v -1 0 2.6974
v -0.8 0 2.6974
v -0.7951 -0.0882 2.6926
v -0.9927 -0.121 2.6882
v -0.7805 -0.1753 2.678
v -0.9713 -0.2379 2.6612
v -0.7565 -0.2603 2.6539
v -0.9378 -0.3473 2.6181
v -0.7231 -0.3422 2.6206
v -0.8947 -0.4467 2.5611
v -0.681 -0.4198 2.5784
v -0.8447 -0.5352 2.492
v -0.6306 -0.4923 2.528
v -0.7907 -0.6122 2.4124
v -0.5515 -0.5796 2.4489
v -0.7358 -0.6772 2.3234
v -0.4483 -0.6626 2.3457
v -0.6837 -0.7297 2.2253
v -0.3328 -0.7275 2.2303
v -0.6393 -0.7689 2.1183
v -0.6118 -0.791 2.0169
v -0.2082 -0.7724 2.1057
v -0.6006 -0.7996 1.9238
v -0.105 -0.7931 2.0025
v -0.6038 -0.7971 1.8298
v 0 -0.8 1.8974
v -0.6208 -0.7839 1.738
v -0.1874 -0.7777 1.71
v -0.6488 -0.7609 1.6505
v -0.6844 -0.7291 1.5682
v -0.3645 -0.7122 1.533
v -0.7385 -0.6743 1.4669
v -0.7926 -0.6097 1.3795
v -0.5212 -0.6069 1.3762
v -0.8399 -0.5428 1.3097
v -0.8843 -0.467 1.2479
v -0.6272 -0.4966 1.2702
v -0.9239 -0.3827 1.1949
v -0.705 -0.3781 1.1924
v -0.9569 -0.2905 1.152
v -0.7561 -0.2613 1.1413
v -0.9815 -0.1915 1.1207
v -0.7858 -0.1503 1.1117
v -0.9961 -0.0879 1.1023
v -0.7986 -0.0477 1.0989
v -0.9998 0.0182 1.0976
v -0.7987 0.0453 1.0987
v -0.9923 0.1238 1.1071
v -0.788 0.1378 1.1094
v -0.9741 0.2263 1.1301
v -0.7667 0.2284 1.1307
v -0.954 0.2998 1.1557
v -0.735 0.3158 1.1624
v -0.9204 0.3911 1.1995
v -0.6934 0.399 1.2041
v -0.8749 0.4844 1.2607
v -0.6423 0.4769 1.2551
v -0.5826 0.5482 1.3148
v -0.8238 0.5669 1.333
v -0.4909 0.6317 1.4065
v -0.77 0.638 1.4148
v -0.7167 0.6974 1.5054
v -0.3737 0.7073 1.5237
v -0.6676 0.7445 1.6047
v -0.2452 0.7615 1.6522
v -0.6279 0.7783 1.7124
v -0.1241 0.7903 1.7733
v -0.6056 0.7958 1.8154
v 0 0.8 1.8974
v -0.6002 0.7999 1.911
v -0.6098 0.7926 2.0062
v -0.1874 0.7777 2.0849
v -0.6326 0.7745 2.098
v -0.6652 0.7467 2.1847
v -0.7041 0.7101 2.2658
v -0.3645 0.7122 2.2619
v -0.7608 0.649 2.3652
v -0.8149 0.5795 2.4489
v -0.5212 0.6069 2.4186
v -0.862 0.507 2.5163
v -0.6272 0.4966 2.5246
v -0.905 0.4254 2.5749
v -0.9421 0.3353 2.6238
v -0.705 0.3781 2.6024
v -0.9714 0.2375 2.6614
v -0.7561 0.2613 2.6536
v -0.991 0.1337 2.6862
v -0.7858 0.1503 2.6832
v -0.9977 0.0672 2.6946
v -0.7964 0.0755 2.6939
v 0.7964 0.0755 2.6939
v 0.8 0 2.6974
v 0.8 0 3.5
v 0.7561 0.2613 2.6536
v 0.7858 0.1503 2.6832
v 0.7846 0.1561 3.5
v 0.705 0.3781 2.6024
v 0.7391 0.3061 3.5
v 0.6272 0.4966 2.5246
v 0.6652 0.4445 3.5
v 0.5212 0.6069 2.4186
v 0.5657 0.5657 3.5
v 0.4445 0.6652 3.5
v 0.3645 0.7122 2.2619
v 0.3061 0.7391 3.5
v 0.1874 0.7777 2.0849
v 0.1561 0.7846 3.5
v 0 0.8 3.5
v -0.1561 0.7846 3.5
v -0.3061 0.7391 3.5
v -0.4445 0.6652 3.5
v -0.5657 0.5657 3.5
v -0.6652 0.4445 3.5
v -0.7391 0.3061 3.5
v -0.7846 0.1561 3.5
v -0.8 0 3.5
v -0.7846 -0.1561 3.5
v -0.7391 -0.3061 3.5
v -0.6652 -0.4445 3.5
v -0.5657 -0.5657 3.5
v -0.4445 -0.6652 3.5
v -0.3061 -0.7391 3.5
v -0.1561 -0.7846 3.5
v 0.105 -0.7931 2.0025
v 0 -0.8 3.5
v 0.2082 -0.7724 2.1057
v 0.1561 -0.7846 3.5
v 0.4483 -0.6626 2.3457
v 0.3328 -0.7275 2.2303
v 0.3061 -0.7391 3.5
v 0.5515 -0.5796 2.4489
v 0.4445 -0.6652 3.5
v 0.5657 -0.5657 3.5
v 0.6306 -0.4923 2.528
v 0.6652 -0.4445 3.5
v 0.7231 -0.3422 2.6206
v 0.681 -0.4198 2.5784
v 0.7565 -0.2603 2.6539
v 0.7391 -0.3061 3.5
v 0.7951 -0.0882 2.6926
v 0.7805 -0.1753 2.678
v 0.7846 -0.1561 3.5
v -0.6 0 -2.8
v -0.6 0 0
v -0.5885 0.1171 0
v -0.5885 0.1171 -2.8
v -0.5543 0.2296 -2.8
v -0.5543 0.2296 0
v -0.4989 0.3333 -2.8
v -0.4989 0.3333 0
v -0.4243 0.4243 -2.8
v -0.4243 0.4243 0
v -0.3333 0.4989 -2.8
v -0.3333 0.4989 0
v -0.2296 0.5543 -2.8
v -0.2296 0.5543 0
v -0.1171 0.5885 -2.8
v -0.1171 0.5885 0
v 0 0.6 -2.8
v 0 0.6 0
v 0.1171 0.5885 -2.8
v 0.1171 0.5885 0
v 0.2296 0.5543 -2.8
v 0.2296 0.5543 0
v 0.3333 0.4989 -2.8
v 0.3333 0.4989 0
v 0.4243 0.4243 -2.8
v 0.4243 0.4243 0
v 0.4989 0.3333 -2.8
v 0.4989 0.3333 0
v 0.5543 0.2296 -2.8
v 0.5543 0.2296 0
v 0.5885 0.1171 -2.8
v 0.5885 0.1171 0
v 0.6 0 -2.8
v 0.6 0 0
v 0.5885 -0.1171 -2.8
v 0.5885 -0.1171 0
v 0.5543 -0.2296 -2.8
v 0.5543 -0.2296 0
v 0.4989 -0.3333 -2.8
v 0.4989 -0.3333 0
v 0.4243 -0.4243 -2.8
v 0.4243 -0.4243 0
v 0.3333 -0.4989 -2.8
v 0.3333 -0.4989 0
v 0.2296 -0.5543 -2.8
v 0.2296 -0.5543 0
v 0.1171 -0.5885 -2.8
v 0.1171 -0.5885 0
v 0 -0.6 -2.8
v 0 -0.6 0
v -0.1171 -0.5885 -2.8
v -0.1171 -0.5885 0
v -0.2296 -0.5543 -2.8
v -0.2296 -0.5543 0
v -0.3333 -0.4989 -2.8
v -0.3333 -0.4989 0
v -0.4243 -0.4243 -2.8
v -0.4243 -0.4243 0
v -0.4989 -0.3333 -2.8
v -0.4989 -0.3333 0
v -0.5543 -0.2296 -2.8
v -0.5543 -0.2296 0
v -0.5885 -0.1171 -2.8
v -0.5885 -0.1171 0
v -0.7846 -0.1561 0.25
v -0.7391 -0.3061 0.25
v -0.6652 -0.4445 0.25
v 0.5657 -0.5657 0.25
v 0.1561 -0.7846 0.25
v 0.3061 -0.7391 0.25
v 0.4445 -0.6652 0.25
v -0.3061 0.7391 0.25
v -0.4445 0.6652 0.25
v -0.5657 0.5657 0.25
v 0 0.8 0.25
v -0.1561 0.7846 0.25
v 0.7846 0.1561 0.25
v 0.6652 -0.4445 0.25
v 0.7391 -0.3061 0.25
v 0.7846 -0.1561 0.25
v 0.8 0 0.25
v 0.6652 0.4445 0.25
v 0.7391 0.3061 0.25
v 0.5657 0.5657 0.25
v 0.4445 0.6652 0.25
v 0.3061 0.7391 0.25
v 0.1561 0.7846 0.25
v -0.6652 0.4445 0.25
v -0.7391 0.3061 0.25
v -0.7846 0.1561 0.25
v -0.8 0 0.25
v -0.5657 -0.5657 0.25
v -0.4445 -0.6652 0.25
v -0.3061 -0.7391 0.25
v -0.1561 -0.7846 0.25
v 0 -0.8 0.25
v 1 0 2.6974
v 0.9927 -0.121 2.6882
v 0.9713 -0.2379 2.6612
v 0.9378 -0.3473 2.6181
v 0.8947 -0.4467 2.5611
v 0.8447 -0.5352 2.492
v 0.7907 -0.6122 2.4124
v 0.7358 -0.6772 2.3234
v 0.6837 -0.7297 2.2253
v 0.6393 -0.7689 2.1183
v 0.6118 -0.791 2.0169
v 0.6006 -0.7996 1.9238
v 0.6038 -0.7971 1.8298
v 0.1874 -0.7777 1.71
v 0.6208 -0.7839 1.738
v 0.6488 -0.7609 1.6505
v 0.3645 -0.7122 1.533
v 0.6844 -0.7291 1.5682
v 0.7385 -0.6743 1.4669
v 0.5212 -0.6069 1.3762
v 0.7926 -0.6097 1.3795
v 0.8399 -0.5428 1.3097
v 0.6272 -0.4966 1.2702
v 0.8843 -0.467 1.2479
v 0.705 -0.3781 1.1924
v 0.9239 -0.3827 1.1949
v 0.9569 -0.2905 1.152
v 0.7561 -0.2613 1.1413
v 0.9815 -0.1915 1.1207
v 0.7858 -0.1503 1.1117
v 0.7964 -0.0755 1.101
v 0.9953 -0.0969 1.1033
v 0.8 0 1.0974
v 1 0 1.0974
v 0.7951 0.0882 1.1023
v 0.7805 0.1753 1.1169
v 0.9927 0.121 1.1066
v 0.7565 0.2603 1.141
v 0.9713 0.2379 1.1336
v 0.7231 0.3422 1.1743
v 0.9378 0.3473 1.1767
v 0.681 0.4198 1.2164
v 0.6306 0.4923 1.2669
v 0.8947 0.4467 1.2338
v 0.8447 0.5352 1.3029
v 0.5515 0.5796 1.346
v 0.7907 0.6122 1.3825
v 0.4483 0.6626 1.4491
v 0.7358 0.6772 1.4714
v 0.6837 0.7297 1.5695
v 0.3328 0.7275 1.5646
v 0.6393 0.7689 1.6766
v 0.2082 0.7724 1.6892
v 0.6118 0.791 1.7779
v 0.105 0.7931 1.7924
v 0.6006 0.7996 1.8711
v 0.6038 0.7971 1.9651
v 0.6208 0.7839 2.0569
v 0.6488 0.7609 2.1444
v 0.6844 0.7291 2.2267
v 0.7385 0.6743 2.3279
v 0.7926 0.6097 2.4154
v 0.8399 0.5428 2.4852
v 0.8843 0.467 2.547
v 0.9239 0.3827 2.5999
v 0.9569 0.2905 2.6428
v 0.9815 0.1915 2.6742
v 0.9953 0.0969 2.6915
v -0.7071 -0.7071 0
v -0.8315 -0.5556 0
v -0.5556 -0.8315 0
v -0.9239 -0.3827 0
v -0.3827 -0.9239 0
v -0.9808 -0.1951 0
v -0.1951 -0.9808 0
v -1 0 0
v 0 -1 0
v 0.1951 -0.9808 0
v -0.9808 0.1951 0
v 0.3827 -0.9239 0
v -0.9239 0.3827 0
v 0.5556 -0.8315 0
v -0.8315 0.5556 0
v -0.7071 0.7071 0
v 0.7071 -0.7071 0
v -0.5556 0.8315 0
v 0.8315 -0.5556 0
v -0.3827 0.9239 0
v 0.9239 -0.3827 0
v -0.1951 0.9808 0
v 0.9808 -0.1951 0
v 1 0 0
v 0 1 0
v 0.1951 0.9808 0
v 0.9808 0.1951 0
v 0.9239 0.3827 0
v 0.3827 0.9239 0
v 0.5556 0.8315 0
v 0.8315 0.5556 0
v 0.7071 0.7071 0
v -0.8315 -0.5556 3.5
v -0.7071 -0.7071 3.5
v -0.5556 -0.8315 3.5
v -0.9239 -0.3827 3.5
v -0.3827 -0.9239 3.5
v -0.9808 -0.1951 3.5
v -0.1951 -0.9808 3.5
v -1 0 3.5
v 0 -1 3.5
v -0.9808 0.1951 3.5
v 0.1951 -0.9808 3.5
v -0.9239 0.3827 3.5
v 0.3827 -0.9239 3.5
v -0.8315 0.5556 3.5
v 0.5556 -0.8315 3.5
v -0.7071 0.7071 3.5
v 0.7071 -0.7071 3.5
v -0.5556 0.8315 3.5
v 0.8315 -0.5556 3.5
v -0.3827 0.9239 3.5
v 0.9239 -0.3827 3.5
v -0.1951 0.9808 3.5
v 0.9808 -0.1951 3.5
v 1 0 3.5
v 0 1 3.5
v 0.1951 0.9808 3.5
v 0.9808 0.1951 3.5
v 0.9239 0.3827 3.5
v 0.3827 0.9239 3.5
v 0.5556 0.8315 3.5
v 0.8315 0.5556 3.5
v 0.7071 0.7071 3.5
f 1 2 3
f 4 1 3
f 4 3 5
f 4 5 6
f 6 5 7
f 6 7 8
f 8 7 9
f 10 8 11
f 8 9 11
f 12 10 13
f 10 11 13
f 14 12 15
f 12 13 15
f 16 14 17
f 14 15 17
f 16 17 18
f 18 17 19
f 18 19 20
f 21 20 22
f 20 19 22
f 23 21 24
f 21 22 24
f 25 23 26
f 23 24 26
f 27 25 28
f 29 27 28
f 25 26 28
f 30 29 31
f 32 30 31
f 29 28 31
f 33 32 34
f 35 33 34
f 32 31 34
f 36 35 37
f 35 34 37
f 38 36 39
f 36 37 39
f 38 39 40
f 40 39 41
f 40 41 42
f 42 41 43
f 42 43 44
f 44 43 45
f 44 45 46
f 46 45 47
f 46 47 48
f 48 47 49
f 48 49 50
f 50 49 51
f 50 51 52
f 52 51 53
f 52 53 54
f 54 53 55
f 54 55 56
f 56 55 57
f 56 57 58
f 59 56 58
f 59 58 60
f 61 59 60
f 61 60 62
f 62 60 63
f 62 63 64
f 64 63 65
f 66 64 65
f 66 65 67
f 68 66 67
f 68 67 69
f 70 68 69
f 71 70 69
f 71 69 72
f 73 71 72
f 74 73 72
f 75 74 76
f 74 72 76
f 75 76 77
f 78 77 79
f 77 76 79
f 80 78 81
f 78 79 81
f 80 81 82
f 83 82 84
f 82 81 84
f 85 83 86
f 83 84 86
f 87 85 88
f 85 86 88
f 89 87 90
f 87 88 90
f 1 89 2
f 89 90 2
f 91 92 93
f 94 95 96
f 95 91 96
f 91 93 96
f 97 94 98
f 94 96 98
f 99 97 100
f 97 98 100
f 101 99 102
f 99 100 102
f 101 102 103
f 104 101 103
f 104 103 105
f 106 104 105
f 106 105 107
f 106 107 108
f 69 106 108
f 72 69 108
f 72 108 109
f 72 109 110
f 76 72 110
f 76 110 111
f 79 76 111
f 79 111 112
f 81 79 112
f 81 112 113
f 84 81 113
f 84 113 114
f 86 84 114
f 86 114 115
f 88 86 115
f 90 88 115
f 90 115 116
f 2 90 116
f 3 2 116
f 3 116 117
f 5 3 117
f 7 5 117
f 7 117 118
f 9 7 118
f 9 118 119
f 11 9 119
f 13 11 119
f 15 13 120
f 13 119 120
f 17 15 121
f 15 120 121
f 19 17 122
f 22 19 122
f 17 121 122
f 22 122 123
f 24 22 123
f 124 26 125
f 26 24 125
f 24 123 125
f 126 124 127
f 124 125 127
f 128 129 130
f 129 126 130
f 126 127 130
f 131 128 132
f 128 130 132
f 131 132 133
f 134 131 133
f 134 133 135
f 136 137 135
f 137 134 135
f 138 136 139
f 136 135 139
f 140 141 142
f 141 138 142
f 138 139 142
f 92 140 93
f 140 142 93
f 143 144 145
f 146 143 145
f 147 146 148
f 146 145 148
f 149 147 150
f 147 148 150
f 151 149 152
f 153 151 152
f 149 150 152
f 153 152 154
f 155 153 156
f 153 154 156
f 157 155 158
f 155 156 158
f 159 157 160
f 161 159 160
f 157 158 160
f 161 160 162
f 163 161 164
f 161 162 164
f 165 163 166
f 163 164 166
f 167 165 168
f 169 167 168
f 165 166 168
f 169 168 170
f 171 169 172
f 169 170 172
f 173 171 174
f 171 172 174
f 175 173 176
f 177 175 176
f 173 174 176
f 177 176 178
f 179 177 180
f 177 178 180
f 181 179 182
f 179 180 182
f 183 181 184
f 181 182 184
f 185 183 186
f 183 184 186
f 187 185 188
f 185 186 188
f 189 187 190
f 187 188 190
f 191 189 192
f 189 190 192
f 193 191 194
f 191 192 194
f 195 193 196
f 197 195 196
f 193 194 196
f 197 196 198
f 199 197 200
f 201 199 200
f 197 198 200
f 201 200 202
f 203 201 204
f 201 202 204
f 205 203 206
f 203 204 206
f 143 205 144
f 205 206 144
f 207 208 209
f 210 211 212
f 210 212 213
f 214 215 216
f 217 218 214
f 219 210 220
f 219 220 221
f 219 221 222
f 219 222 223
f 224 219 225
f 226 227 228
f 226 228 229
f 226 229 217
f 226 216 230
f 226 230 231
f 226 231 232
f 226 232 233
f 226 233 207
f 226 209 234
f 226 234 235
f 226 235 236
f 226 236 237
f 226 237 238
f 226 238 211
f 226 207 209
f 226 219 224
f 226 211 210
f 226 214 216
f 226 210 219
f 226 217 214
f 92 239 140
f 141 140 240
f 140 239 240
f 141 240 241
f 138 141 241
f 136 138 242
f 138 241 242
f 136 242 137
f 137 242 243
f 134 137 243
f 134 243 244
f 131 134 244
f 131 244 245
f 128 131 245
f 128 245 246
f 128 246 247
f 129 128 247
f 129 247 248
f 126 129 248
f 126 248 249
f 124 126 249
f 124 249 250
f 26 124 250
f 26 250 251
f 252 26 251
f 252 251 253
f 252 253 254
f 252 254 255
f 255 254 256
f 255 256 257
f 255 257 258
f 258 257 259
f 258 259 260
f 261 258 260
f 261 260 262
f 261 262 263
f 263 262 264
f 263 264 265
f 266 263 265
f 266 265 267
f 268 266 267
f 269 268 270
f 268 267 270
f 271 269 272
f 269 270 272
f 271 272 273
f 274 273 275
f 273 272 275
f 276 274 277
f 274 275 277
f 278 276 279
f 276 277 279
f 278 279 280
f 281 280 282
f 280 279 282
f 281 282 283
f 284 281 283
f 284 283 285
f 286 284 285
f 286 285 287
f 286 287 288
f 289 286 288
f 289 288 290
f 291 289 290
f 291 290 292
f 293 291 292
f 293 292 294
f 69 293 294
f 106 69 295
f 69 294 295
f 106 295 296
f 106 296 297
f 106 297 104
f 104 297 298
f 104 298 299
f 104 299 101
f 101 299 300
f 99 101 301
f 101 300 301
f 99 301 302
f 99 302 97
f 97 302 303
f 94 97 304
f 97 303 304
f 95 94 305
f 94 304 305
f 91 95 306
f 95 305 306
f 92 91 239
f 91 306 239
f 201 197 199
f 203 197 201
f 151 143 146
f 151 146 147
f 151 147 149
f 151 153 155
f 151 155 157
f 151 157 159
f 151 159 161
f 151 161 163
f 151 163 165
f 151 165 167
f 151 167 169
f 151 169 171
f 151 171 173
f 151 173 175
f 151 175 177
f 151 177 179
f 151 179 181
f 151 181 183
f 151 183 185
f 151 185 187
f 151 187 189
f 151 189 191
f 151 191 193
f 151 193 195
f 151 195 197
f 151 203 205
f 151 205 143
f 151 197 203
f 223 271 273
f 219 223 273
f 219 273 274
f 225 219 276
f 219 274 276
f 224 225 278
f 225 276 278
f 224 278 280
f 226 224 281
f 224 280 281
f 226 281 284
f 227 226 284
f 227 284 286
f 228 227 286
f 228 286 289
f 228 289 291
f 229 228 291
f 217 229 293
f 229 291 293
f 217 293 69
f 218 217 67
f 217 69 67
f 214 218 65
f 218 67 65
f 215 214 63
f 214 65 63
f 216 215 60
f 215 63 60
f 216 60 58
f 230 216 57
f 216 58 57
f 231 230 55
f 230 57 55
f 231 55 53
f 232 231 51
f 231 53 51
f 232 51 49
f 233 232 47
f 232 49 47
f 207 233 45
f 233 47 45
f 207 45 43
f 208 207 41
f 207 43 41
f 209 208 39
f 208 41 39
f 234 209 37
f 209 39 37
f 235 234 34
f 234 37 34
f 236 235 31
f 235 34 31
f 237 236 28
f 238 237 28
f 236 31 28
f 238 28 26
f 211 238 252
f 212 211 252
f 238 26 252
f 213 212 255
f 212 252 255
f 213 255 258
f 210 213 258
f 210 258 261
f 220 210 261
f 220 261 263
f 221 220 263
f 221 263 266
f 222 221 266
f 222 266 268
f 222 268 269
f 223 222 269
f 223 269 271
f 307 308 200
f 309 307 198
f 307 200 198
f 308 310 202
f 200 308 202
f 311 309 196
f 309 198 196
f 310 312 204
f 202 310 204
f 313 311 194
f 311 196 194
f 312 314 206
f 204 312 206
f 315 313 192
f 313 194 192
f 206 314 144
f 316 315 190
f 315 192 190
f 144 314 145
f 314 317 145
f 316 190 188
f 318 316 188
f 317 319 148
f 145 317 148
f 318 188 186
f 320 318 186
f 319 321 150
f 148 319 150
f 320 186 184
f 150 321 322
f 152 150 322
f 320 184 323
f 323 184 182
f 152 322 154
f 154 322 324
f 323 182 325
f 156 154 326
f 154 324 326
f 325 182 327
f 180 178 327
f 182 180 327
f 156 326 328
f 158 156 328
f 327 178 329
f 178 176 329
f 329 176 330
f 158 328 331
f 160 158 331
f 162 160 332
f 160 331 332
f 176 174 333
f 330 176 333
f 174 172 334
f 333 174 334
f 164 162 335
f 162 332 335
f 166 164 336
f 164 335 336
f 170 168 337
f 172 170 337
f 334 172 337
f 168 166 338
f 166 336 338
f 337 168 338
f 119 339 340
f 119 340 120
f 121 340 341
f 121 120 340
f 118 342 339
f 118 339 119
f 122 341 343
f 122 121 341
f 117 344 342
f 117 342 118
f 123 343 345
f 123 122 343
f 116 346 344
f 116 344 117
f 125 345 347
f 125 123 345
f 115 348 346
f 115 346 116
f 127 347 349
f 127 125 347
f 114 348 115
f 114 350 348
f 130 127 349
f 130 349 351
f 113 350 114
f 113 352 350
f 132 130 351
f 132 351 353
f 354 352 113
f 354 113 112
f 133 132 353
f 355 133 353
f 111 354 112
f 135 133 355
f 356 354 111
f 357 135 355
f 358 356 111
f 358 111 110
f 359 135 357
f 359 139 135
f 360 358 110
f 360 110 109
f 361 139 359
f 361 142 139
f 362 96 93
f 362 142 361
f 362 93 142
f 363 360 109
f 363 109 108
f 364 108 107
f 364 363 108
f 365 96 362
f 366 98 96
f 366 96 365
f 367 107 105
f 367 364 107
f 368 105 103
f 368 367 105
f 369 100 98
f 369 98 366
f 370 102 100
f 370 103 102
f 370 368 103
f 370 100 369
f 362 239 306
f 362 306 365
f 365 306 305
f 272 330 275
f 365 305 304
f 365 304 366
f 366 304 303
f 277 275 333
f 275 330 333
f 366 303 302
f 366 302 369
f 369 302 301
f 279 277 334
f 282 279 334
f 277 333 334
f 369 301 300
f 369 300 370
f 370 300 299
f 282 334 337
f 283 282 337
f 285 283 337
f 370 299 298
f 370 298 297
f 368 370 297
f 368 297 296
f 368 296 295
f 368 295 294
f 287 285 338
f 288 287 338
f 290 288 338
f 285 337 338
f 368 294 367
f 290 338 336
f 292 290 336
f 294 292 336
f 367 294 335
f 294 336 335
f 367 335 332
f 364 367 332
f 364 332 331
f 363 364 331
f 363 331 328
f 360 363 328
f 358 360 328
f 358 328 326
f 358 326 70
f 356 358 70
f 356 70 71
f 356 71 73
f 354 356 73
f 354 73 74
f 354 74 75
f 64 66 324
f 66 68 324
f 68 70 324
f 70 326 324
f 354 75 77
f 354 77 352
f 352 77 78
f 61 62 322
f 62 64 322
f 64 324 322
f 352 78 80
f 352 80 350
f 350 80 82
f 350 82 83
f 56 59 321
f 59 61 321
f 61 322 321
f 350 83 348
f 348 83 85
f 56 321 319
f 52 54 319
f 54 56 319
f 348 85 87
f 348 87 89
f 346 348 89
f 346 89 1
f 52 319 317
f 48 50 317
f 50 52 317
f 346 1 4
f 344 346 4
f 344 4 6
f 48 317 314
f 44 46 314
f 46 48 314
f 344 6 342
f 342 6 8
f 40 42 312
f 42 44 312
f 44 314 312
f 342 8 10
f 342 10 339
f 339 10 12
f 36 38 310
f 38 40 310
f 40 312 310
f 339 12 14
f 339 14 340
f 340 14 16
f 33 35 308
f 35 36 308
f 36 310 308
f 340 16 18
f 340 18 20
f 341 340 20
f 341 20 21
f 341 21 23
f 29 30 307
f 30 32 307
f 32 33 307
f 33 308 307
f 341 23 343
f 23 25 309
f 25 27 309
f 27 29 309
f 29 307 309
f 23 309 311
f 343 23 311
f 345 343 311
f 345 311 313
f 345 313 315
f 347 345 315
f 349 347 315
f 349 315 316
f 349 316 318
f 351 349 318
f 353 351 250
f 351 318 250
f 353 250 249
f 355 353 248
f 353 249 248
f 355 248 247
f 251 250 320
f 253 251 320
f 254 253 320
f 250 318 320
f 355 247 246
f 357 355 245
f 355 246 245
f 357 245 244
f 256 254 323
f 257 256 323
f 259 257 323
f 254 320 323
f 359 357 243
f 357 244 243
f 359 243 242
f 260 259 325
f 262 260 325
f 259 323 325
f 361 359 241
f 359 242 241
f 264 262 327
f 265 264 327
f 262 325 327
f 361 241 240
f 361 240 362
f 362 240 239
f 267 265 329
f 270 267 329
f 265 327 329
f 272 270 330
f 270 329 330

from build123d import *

# Parameters (mm, degrees)
SKETCH_1_R          = 1
EXTRUDE_1_DEPTH     = 3.5
SKETCH_3_R          = 0.6
EXTRUDE_2_DEPTH     = 2.8
SKETCH_4_R          = 0.8
CUT_EXTRUDE_1_DEPTH = 1.25
SKETCH_5_R          = 0.8
CUT_EXTRUDE_2_DEPTH = 3.25


with BuildPart() as part:
    # 草图1 → 凸台-拉伸1 (new body)
    with BuildSketch(Plane.XY):
        Circle(SKETCH_1_R)
    extrude(amount=EXTRUDE_1_DEPTH)

    # 草图3 → 凸台-拉伸2 (add)
    with BuildSketch(Plane(origin=(0, 0, 0), x_dir=(-1, 0, 0), z_dir=(0, 0, -1))):
        Circle(SKETCH_3_R)
    extrude(amount=EXTRUDE_2_DEPTH)

    # 草图4 → 切除-拉伸1 (cut, symmetric)
    with BuildSketch(Plane(origin=(0, 0, 0), x_dir=(0, 0, -1), z_dir=(1, 0, 0))):
        with Locations(Location((-1.897429081, 0, 0), (0, 0, 180.000000009))):
            Circle(SKETCH_4_R)
    extrude(amount=CUT_EXTRUDE_1_DEPTH, both=True, mode=Mode.SUBTRACT)

    # 草图5 → 切除-拉伸2 (cut, symmetric)
    with BuildSketch(Plane.XY.offset(3.5)):
        Circle(SKETCH_5_R)
    extrude(amount=CUT_EXTRUDE_2_DEPTH, both=True, mode=Mode.SUBTRACT)


solid = part.part
